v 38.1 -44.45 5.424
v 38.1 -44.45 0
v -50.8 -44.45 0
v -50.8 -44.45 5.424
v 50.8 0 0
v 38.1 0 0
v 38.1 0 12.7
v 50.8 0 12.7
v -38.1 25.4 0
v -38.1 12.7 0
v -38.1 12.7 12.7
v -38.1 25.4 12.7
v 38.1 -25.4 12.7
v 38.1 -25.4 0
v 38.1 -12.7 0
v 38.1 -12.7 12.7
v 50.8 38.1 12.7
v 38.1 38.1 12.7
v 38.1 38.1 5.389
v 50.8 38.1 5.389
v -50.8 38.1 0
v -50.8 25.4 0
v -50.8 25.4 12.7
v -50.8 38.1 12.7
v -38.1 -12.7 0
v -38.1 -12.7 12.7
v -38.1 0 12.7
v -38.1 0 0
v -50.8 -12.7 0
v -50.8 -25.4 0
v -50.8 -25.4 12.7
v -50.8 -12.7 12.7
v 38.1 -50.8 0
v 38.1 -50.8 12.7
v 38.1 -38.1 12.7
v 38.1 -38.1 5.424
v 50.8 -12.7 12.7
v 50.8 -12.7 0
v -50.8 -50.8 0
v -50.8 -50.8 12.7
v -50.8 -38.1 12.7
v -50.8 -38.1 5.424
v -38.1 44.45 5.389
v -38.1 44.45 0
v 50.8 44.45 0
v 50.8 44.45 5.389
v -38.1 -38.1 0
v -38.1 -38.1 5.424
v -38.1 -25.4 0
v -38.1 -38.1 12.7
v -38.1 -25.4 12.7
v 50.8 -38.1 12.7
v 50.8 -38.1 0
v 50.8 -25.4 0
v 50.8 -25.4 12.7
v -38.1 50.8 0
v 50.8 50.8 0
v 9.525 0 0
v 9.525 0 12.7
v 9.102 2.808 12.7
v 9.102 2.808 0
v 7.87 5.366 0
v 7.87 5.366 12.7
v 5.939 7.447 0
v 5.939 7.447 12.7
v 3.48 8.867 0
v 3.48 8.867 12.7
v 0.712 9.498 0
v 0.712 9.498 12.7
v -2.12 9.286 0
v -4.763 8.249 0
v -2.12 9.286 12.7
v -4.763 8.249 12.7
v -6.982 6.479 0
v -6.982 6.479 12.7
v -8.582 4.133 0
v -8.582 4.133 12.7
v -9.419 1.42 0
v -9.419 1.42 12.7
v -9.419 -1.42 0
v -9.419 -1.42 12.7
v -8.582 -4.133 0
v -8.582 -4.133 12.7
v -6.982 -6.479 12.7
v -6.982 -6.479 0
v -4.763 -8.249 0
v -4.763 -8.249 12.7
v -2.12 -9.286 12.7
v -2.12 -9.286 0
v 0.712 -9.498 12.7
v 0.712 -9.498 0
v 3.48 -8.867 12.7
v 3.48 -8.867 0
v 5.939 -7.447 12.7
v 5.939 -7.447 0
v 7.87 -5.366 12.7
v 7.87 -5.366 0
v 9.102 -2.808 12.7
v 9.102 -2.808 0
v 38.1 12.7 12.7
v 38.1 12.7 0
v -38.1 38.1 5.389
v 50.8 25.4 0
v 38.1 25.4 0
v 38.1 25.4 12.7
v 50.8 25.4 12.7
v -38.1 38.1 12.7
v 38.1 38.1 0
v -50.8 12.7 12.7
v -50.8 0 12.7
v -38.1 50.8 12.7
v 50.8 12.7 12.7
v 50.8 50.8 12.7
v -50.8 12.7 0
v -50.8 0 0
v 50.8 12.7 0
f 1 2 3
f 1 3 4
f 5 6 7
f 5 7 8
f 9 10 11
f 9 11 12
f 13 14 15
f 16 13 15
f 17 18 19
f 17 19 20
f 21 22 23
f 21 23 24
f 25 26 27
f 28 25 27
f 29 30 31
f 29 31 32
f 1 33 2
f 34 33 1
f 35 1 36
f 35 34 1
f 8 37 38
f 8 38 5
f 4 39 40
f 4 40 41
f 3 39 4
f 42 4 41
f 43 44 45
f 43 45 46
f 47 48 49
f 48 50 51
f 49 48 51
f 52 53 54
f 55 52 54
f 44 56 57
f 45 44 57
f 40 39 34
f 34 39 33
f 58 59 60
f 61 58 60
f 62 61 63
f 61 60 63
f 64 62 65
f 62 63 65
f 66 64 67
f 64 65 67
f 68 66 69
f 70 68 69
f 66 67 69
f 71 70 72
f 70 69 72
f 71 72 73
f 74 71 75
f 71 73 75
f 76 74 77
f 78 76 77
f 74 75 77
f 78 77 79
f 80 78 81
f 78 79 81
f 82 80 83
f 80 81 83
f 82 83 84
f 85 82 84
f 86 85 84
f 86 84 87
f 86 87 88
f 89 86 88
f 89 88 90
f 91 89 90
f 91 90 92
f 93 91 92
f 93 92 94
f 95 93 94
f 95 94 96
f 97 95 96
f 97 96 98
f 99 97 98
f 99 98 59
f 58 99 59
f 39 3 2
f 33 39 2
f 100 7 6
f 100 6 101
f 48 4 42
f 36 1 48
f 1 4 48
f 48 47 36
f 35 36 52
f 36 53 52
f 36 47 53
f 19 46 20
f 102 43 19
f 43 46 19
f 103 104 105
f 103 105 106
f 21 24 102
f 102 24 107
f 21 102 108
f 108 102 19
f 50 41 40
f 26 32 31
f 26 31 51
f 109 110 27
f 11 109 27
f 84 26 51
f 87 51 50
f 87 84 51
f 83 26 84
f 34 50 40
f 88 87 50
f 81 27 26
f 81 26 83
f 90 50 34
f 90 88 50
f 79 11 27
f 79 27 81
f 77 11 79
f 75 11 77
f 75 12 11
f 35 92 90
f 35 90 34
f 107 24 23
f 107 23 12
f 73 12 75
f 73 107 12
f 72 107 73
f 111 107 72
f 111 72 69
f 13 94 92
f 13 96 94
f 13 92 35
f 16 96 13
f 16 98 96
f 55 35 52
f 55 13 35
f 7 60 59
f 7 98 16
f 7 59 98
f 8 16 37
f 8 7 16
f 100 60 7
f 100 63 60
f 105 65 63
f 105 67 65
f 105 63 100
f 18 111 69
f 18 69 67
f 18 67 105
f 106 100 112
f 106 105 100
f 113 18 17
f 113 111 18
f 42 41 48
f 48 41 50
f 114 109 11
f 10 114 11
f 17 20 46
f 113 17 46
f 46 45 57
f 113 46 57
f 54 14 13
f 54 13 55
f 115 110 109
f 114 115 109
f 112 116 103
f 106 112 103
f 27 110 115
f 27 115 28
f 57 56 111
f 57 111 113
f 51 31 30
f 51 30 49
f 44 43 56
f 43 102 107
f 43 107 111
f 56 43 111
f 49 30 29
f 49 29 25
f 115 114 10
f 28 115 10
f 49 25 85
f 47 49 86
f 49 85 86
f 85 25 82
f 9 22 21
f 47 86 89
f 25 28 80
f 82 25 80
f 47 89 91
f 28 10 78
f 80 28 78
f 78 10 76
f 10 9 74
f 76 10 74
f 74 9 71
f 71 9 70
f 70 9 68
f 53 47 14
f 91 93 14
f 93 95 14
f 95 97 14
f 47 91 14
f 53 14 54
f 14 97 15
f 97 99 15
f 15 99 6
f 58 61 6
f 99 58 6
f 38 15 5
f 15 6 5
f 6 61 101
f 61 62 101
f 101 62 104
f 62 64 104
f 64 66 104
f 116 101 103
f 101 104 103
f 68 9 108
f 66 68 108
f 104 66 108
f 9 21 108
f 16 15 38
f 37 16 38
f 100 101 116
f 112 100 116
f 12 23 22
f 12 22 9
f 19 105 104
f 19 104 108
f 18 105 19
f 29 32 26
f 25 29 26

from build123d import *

# Parameters (mm, degrees)
F0_W      = 101.6
F0_H      = 101.6
F1_DEPTH  = 12.7
F2_W      = 12.7
F2_H      = 12.7
F3_DEPTH  = 12.701
F4_W      = 12.7
F4_H      = 12.7
F5_DEPTH  = 12.701
F6_W      = 6.35
F6_H      = 5.423685
F7_DEPTH  = 88.901
F8_W      = 6.35
F8_H      = 5.389227
F9_DEPTH  = 88.901
F10_R     = 9.525
F11_DEPTH = 12.701


with BuildPart() as f1:
    # F0 (on Top) → F1 (new body)
    with BuildSketch(Plane.XY):
        Rectangle(F0_W, F0_H)
    extrude(amount=F1_DEPTH)

    # F2 (on face) → F3 (cut, through all)
    with BuildSketch(Plane.XY.offset(12.7)):
        with Locations((-44.45, 19.05)):
            Rectangle(F2_W, F2_H)
        with Locations((-44.45, 44.45)):
            Rectangle(F2_W, F2_H)
        with Locations((-44.45, -6.35)):
            Rectangle(F2_W, F2_H)
        with Locations((-44.45, -31.75)):
            Rectangle(F2_W, F2_H)
    extrude(amount=-F3_DEPTH, mode=Mode.SUBTRACT)

    # F4 (on face) → F5 (cut, through all)
    with BuildSketch(Plane.XY.offset(12.7)):
        with Locations((44.45, 31.75)):
            Rectangle(F4_W, F4_H)
        with Locations((44.45, 6.35)):
            Rectangle(F4_W, F4_H)
        with Locations((44.45, -19.05)):
            Rectangle(F4_W, F4_H)
        with Locations((44.45, -44.45)):
            Rectangle(F4_W, F4_H)
    extrude(amount=-F5_DEPTH, mode=Mode.SUBTRACT)

    # F6 (on face) → F7 (cut, through all)
    with BuildSketch(Plane.YZ.offset(38.1)):
        with Locations((-41.275, 2.711842)):
            Rectangle(F6_W, F6_H)
    extrude(amount=-F7_DEPTH, mode=Mode.SUBTRACT)

    # F8 (on face) → F9 (cut, through all)
    with BuildSketch(Plane(origin=(-38.1, 0, 0), x_dir=(0, -1, 0), z_dir=(-1, 0, 0))):
        with Locations((-41.275, 2.694613)):
            Rectangle(F8_W, F8_H)
    extrude(amount=-F9_DEPTH, mode=Mode.SUBTRACT)

    # F10 (on face) → F11 (cut, through all)
    with BuildSketch(Plane.XY.offset(12.7)):
        Circle(F10_R)
    extrude(amount=-F11_DEPTH, mode=Mode.SUBTRACT)


solid = f1.part
